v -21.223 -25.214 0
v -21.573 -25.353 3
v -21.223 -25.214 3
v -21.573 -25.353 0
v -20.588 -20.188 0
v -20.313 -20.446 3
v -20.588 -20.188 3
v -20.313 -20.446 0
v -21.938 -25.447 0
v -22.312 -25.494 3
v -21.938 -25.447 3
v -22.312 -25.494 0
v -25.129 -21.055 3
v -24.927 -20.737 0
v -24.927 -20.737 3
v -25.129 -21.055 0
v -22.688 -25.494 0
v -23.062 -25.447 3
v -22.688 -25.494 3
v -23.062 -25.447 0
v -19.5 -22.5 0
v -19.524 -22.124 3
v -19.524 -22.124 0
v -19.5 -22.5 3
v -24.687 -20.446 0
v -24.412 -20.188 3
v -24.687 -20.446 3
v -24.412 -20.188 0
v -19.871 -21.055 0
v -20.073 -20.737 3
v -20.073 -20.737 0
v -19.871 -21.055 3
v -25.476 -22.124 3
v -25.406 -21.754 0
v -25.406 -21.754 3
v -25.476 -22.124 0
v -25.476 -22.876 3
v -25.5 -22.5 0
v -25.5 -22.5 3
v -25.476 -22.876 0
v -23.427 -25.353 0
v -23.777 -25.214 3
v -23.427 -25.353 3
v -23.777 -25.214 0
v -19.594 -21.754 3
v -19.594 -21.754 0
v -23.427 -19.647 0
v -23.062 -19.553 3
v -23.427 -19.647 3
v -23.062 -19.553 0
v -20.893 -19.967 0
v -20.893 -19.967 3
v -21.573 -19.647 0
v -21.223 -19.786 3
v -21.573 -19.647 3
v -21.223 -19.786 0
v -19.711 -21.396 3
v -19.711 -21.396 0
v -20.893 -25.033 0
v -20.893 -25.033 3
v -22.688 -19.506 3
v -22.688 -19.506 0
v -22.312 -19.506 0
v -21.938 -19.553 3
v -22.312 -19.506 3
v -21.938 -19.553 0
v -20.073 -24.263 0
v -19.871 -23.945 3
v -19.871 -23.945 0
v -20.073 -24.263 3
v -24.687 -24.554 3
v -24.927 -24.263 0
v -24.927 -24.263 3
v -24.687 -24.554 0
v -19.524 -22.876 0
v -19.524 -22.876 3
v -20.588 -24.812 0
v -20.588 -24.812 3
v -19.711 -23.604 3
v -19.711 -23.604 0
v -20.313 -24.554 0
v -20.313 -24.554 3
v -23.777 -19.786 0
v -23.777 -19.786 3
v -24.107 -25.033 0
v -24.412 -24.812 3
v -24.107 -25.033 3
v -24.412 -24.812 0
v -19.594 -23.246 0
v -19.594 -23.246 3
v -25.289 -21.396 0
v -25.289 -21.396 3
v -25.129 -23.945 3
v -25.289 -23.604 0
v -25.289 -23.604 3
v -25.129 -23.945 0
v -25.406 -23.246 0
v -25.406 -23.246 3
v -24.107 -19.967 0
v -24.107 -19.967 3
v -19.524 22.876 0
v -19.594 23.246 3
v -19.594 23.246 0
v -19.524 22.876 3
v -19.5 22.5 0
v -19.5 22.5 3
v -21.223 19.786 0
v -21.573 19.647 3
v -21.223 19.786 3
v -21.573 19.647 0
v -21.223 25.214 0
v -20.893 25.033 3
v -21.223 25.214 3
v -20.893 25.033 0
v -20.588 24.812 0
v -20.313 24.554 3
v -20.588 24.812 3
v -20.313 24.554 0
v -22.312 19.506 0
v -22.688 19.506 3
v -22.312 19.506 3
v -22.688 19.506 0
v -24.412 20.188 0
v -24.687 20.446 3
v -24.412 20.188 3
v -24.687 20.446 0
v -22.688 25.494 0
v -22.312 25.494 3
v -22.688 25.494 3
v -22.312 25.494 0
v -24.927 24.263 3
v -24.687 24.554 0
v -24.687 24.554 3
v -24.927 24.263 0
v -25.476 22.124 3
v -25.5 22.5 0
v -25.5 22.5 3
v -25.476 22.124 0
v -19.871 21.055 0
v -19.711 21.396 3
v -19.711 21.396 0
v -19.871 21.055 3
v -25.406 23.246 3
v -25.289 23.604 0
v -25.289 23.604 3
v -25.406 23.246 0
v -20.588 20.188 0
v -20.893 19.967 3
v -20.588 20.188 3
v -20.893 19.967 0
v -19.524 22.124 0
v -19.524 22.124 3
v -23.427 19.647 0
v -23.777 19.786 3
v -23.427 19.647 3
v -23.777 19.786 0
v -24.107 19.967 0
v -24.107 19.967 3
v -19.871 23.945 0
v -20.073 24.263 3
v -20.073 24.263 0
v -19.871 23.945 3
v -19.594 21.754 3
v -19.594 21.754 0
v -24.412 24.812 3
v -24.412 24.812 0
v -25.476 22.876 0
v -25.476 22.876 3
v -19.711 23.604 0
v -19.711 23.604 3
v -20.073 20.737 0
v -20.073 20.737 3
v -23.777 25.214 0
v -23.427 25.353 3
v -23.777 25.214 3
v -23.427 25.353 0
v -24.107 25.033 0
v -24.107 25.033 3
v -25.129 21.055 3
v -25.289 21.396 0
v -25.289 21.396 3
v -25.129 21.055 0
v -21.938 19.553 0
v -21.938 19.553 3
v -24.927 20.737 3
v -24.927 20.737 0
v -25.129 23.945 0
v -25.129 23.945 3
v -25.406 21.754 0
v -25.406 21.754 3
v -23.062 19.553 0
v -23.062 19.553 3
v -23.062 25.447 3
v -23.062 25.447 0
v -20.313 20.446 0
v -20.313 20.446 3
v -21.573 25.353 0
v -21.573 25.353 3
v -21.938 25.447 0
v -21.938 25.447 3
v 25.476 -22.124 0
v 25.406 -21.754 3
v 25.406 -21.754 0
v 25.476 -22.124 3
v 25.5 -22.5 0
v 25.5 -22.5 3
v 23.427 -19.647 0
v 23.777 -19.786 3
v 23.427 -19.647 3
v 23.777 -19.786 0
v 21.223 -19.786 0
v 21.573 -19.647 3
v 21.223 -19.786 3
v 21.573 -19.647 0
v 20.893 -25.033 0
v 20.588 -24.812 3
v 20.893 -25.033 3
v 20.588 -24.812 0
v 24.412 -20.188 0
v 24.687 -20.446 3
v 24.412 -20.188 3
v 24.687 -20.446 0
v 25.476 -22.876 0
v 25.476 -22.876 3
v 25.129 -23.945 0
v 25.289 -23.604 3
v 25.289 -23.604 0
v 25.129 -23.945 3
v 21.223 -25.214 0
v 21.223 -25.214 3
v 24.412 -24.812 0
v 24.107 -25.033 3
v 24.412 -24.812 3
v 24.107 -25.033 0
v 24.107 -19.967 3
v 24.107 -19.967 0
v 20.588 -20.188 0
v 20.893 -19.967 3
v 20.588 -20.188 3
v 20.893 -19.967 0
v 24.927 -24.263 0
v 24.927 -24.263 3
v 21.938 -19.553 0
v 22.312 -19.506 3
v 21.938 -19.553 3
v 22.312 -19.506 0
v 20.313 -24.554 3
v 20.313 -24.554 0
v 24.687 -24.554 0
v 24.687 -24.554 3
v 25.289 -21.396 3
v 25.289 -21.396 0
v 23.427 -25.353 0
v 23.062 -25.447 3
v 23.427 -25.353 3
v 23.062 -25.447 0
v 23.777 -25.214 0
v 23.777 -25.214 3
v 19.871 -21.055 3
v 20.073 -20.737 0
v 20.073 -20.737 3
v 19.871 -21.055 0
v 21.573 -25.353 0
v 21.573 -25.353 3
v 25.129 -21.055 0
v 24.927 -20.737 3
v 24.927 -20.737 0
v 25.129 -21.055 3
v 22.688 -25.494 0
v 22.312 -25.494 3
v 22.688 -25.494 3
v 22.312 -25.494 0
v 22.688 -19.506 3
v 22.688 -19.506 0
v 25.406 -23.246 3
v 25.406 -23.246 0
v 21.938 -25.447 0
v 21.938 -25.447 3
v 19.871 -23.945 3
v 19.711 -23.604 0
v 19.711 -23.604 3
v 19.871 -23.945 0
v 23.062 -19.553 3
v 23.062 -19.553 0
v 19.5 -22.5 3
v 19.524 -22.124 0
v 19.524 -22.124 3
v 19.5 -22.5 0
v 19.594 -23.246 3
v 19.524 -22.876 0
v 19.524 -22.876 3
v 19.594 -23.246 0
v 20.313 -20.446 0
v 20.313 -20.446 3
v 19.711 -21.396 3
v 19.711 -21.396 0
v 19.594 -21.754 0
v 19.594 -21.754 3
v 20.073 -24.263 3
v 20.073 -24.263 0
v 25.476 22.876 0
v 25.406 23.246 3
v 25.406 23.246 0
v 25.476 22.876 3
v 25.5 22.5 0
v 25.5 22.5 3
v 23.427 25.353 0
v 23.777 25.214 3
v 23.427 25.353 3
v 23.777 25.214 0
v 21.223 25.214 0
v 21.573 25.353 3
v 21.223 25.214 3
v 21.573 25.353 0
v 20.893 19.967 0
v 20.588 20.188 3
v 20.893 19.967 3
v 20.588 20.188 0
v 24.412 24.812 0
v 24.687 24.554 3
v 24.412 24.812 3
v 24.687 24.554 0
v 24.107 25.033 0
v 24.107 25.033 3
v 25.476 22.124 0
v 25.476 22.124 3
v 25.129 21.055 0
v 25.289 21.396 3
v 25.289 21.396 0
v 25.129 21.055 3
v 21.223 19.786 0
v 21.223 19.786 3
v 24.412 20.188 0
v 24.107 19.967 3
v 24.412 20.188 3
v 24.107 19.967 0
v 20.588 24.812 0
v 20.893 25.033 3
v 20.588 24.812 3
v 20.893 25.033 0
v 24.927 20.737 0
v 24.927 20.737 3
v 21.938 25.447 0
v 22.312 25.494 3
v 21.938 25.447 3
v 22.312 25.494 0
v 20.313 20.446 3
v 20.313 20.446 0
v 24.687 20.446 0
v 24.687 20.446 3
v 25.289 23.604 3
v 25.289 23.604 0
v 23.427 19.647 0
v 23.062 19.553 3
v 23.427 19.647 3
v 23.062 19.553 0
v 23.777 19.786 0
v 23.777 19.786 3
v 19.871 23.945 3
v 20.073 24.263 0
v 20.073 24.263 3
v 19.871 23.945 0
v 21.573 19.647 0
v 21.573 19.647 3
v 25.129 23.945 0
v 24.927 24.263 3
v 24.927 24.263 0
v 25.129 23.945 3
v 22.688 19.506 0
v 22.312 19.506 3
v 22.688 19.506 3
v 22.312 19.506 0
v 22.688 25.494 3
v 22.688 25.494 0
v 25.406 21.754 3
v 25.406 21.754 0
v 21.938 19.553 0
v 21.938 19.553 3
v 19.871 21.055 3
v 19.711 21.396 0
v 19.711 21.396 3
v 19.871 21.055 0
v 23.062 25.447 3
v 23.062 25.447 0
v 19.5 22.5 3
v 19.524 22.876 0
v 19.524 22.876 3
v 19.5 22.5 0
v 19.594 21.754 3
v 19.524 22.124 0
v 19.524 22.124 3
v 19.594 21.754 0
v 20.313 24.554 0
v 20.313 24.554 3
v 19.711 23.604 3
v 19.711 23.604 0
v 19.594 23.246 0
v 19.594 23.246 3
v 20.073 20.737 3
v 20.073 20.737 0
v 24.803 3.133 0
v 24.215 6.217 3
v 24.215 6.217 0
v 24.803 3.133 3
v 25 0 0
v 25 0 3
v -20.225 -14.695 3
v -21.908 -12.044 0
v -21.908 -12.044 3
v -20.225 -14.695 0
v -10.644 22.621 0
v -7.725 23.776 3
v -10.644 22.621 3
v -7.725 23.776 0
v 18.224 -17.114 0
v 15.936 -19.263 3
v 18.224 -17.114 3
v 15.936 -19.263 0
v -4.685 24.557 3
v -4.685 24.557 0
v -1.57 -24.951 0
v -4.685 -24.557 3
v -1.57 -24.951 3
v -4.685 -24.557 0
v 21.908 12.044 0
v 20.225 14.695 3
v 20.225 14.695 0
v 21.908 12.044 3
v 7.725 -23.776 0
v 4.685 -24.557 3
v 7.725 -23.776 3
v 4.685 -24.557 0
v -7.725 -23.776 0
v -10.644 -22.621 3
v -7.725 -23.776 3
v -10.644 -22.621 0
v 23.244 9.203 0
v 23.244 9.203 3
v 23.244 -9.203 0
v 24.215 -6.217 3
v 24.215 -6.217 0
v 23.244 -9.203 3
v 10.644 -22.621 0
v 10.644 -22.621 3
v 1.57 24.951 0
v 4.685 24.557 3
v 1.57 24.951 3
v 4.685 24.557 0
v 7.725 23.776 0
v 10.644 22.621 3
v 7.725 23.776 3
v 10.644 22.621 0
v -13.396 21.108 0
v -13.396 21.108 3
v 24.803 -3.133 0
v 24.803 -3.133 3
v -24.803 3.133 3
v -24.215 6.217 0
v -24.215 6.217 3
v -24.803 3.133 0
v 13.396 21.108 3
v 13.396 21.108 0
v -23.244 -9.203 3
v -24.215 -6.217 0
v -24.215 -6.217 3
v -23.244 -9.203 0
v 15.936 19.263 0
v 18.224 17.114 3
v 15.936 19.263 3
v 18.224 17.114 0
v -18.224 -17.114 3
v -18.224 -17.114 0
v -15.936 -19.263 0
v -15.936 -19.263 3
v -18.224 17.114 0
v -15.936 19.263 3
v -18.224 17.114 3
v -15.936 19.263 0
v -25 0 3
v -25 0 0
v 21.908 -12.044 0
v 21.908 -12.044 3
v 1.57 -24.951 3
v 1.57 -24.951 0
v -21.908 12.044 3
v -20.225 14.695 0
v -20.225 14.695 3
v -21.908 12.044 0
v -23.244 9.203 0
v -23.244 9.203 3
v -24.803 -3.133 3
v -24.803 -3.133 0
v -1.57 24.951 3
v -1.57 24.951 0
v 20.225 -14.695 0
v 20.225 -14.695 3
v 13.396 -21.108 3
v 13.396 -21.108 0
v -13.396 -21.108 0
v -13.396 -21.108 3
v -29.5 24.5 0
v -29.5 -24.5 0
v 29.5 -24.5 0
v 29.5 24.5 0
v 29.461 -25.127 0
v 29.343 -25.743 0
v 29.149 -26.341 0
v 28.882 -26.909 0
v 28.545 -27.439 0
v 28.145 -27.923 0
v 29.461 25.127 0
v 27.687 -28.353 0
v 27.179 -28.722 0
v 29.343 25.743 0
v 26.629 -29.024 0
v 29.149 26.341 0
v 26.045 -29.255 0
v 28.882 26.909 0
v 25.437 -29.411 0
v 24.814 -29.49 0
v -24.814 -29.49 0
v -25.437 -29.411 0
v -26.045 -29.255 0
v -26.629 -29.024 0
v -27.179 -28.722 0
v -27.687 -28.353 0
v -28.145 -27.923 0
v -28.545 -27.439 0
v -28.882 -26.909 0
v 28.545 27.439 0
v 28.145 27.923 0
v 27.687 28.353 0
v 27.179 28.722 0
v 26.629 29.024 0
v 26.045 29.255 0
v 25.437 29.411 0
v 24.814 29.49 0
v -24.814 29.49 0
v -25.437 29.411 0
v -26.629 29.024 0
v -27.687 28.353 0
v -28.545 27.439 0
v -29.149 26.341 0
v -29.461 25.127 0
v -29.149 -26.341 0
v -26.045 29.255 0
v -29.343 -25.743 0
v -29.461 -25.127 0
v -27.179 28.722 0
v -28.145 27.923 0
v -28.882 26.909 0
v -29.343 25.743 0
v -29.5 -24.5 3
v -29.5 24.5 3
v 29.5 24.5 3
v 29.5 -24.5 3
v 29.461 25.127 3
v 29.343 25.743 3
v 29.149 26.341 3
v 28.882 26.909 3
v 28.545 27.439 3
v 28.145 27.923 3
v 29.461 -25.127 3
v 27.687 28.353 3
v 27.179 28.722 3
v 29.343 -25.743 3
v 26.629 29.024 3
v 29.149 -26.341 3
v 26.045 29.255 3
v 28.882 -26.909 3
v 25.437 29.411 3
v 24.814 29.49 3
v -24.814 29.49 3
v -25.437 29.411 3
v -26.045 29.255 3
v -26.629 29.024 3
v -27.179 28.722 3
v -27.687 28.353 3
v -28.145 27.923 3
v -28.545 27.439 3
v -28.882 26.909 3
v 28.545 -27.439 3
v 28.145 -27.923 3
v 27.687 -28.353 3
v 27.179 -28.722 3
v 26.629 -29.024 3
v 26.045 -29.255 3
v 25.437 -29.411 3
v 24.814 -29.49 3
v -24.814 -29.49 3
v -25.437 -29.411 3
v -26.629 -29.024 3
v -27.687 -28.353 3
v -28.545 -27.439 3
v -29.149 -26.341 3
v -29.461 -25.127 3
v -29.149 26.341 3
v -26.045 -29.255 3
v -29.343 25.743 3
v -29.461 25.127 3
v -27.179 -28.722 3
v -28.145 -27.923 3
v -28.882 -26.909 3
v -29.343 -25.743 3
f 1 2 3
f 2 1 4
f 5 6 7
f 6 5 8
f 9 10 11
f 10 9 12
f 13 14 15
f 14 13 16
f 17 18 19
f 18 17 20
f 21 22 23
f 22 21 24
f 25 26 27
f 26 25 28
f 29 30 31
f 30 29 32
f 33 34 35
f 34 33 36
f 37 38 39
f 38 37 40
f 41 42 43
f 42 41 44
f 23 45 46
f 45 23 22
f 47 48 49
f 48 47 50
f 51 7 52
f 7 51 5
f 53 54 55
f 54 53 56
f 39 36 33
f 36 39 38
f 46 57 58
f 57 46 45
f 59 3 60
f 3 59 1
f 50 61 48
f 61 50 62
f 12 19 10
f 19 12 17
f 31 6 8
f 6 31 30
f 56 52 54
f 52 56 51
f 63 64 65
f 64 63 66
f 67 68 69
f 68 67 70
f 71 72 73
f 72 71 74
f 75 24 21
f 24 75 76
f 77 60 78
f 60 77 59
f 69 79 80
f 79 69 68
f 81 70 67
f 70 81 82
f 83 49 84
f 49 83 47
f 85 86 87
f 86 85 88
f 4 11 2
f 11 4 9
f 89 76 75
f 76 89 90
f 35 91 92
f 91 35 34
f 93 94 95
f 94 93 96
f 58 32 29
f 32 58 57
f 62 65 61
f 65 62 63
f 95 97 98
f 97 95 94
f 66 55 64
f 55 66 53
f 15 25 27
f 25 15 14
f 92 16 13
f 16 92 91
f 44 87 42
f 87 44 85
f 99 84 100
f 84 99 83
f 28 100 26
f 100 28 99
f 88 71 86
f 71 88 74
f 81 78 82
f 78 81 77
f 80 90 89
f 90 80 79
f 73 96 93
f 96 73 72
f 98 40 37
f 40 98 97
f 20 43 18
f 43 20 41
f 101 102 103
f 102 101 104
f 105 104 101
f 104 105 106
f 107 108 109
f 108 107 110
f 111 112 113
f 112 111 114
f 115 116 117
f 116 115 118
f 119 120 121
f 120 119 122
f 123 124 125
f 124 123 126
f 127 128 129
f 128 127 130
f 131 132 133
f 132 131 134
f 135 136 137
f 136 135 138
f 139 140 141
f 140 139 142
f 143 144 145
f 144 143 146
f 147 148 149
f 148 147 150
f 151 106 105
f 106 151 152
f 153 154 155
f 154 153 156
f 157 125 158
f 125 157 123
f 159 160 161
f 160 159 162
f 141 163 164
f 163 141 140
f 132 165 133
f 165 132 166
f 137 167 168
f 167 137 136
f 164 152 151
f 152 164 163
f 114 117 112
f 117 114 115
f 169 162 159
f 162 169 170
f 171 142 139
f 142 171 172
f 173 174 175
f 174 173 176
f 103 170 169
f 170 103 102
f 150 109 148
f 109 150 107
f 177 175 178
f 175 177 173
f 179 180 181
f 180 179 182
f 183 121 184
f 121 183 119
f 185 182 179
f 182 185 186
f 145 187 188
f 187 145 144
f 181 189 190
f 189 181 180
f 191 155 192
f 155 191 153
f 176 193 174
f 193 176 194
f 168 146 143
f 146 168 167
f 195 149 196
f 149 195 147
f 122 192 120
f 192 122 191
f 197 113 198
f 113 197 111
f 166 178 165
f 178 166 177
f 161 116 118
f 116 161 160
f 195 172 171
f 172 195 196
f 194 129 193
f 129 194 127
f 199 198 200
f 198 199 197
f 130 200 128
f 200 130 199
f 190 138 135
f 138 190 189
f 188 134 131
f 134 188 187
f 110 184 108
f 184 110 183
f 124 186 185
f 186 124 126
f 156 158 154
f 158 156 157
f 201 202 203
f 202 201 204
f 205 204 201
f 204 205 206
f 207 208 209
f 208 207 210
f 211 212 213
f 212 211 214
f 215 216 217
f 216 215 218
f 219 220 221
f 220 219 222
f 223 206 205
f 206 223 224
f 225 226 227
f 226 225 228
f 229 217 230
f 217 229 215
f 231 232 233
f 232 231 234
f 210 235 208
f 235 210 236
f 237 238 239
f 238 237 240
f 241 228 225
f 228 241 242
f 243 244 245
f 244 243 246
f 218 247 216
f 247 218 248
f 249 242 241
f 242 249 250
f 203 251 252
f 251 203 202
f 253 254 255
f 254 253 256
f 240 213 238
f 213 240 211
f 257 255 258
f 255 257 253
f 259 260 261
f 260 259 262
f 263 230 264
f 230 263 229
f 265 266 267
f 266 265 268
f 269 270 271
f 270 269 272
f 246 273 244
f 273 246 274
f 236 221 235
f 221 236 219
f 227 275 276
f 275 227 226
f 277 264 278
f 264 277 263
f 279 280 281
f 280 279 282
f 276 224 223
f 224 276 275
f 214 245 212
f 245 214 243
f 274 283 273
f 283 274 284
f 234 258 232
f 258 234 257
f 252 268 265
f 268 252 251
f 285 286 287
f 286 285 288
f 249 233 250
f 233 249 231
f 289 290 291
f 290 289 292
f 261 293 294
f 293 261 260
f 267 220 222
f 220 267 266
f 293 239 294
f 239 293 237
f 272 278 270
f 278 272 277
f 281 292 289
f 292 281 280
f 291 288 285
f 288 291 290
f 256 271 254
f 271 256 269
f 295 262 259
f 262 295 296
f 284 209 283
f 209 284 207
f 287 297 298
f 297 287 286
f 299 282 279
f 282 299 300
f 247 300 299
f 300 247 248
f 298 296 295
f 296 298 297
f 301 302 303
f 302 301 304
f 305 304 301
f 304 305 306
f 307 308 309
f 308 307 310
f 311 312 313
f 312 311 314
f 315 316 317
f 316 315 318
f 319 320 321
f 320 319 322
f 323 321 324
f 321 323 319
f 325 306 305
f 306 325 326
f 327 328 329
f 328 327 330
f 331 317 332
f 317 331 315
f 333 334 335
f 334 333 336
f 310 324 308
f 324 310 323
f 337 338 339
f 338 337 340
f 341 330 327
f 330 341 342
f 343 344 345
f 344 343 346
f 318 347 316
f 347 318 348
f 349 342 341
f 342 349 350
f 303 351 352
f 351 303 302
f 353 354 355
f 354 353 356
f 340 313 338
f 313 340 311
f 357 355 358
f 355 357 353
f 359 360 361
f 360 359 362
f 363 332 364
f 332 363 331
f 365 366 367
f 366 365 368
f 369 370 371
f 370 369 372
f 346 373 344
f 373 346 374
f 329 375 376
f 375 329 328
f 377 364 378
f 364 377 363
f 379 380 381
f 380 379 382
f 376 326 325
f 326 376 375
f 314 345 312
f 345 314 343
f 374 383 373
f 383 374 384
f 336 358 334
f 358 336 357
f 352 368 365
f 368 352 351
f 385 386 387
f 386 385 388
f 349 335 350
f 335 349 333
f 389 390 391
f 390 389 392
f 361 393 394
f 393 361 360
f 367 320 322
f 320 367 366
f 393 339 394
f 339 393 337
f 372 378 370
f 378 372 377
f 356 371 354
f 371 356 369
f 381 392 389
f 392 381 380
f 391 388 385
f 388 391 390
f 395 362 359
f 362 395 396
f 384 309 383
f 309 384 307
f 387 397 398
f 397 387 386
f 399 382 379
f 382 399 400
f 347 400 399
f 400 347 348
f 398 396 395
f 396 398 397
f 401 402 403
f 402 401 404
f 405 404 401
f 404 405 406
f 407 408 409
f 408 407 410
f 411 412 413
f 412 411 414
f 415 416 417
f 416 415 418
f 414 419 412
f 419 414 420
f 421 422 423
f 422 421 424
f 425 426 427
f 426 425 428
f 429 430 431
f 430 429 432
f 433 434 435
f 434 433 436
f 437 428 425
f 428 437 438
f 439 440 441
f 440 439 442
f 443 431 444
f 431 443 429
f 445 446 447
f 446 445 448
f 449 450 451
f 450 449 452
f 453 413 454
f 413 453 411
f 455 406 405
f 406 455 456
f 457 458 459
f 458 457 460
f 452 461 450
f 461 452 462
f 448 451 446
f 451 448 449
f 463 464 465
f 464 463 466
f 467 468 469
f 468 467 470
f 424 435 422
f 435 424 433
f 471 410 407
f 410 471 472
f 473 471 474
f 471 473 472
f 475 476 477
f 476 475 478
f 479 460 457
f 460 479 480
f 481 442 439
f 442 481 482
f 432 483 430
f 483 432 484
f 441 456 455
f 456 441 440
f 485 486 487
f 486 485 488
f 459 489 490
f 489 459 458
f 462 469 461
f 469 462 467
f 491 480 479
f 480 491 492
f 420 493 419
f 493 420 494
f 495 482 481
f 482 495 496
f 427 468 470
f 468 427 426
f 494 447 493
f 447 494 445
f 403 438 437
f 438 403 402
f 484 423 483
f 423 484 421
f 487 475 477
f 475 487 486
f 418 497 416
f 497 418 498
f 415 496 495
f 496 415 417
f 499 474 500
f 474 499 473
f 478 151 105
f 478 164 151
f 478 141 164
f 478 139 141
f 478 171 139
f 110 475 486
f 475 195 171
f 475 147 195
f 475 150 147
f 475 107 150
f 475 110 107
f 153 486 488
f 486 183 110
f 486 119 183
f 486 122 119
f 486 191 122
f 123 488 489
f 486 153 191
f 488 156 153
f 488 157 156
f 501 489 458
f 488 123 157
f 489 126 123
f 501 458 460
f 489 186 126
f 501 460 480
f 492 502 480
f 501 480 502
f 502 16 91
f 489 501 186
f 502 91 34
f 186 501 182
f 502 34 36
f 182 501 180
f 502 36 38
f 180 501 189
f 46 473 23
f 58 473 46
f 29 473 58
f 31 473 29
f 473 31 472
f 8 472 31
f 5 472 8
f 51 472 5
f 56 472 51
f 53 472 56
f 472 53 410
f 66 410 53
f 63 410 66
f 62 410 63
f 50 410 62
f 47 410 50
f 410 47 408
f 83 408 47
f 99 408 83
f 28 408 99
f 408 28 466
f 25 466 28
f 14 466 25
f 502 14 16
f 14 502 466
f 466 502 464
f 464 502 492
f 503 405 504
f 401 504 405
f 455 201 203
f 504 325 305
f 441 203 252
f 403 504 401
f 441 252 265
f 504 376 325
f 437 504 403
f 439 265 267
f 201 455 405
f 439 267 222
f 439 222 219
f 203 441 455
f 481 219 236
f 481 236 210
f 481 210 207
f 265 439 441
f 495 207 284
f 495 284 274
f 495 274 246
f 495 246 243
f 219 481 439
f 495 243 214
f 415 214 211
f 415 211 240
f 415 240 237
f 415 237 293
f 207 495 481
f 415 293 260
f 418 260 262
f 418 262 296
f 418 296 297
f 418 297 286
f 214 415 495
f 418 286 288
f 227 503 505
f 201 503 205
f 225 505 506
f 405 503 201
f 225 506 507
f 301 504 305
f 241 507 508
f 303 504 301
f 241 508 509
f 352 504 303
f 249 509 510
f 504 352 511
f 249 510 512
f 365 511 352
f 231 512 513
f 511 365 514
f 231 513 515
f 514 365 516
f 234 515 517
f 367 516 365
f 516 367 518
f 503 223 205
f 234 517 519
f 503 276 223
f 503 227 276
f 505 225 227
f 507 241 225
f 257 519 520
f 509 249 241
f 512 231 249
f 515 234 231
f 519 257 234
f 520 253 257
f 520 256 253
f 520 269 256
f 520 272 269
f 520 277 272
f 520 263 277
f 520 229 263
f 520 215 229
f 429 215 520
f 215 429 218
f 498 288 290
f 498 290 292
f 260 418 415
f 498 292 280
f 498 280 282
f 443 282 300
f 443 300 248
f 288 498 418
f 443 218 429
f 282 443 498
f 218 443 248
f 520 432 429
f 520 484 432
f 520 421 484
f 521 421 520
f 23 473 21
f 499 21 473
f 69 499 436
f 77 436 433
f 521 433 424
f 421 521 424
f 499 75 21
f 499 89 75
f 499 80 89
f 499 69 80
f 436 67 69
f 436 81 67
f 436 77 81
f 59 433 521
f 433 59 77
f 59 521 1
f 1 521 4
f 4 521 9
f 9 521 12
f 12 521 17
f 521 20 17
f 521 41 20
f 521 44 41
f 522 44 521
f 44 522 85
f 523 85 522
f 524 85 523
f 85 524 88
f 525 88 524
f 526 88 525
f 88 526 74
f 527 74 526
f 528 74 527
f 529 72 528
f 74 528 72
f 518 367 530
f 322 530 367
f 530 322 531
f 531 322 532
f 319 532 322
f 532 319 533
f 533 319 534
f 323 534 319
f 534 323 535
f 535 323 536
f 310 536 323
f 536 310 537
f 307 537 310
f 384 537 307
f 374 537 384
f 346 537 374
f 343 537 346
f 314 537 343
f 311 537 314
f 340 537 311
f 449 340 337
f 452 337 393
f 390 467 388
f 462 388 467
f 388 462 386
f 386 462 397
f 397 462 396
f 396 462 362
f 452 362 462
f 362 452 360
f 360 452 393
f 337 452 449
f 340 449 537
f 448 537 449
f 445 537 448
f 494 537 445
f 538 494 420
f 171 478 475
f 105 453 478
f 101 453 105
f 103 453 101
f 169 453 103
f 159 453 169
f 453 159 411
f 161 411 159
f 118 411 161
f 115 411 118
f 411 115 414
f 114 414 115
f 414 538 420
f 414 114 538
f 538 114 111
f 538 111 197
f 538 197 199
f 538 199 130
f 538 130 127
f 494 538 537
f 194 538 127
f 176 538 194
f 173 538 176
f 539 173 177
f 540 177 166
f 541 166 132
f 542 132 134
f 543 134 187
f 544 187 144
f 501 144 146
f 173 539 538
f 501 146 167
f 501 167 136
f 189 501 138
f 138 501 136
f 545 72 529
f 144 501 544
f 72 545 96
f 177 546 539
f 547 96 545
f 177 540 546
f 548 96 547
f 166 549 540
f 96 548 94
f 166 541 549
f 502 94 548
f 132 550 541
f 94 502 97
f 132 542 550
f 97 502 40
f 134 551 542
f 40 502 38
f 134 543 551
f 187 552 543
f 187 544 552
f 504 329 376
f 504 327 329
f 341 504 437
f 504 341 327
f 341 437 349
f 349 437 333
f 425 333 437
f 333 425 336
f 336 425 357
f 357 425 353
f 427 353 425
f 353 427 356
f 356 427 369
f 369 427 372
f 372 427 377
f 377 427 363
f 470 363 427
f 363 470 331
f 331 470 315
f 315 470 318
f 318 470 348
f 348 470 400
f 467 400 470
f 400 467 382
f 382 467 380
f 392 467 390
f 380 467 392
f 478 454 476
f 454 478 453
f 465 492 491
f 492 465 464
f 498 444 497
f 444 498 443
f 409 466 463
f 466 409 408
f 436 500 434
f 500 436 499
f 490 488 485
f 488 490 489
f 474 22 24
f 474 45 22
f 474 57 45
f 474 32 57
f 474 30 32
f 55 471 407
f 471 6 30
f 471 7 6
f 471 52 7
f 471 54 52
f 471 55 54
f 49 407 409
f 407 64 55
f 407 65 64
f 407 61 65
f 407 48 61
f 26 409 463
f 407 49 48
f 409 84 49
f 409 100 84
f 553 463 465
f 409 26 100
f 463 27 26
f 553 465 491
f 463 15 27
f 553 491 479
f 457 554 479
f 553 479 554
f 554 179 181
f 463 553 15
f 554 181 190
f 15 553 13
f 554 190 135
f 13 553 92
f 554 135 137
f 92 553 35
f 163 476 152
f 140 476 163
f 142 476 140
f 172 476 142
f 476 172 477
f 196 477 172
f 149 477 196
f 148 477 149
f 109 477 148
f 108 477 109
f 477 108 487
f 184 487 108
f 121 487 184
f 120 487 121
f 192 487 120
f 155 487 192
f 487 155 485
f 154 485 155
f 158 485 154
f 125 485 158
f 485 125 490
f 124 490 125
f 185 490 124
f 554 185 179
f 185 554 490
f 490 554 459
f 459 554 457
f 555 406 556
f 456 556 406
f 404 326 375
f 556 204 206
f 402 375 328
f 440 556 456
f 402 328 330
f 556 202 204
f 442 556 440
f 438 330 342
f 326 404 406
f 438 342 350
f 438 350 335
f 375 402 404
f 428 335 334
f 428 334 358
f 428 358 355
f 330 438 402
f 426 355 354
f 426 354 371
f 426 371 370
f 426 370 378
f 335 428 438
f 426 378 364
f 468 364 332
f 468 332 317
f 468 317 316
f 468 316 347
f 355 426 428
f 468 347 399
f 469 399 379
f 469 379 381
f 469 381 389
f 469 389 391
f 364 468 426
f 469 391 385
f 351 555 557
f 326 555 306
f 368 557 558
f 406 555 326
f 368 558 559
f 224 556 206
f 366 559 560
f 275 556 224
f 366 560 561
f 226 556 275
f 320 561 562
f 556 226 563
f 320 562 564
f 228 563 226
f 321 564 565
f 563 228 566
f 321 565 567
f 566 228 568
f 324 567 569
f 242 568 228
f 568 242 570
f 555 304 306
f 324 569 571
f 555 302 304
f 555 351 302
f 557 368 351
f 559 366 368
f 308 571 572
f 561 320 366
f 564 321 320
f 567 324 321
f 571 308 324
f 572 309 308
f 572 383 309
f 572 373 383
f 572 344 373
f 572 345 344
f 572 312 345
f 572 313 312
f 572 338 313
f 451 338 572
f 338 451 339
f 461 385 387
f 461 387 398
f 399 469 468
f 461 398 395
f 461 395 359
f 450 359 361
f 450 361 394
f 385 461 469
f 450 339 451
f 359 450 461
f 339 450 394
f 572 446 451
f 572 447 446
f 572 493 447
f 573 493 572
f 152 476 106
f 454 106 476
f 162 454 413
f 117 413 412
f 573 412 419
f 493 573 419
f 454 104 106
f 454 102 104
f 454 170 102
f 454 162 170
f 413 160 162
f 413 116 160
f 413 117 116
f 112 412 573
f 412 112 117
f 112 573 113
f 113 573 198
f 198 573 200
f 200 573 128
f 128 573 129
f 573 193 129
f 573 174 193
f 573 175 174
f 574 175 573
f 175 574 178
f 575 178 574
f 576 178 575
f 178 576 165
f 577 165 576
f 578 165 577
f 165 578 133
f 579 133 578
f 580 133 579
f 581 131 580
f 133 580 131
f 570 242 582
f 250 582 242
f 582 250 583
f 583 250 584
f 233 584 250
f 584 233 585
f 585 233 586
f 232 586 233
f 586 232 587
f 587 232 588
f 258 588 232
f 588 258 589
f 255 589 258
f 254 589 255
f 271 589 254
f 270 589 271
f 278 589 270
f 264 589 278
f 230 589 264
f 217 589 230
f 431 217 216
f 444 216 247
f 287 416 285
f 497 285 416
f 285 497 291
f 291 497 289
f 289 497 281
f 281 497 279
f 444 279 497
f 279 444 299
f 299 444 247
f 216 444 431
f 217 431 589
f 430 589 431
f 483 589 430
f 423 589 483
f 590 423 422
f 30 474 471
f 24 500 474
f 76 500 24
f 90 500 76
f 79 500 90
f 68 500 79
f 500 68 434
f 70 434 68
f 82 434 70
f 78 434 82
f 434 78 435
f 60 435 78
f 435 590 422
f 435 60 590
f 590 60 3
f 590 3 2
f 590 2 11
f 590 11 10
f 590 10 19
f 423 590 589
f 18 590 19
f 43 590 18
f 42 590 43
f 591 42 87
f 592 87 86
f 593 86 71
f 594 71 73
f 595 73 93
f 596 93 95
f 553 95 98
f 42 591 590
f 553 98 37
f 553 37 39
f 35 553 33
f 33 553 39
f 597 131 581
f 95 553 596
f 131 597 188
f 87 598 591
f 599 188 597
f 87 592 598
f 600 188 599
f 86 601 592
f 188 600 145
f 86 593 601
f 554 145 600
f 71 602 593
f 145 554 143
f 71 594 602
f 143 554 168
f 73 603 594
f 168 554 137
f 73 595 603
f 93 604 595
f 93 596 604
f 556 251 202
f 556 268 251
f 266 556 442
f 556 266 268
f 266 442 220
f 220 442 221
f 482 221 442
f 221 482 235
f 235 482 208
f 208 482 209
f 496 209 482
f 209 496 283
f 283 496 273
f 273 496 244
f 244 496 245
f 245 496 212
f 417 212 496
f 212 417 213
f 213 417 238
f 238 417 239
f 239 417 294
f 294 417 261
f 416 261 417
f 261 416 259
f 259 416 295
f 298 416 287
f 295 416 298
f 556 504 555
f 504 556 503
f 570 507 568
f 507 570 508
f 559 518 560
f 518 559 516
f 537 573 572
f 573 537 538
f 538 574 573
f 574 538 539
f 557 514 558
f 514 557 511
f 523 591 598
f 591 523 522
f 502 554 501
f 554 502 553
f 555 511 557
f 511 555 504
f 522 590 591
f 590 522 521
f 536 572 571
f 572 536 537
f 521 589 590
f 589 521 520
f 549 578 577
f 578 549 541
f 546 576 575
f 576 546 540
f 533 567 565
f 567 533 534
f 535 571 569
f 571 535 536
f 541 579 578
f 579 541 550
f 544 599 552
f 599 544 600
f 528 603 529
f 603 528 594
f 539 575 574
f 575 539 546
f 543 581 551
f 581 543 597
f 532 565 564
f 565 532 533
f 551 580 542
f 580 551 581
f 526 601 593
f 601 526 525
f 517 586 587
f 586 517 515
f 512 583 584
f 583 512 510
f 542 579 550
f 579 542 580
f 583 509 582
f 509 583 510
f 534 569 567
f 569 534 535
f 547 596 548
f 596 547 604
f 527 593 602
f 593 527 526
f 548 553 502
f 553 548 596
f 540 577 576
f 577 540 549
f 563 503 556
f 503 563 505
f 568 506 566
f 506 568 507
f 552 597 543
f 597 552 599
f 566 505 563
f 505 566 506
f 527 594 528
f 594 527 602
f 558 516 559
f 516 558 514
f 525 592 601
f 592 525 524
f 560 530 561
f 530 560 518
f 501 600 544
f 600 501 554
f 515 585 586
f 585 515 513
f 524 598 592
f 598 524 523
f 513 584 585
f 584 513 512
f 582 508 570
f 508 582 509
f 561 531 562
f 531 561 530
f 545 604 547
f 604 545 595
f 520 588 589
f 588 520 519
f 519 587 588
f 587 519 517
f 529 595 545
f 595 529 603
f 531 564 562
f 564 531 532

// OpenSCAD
$fn = 50;


difference() {
	union() {
		hull() {
			translate(v = [-24.5000000000, 24.5000000000, 0]) {
				cylinder(h = 3, r = 5);
			}
			translate(v = [24.5000000000, 24.5000000000, 0]) {
				cylinder(h = 3, r = 5);
			}
			translate(v = [-24.5000000000, -24.5000000000, 0]) {
				cylinder(h = 3, r = 5);
			}
			translate(v = [24.5000000000, -24.5000000000, 0]) {
				cylinder(h = 3, r = 5);
			}
		}
	}
	union() {
		#translate(v = [-22.5000000000, -22.5000000000, -100.0000000000]) {
			cylinder(h = 200, r = 3.0000000000);
		}
		#translate(v = [-22.5000000000, 22.5000000000, -100.0000000000]) {
			cylinder(h = 200, r = 3.0000000000);
		}
		#translate(v = [22.5000000000, -22.5000000000, -100.0000000000]) {
			cylinder(h = 200, r = 3.0000000000);
		}
		#translate(v = [22.5000000000, 22.5000000000, -100.0000000000]) {
			cylinder(h = 200, r = 3.0000000000);
		}
		#cylinder(h = 3, r = 25.0000000000);
	}
}
